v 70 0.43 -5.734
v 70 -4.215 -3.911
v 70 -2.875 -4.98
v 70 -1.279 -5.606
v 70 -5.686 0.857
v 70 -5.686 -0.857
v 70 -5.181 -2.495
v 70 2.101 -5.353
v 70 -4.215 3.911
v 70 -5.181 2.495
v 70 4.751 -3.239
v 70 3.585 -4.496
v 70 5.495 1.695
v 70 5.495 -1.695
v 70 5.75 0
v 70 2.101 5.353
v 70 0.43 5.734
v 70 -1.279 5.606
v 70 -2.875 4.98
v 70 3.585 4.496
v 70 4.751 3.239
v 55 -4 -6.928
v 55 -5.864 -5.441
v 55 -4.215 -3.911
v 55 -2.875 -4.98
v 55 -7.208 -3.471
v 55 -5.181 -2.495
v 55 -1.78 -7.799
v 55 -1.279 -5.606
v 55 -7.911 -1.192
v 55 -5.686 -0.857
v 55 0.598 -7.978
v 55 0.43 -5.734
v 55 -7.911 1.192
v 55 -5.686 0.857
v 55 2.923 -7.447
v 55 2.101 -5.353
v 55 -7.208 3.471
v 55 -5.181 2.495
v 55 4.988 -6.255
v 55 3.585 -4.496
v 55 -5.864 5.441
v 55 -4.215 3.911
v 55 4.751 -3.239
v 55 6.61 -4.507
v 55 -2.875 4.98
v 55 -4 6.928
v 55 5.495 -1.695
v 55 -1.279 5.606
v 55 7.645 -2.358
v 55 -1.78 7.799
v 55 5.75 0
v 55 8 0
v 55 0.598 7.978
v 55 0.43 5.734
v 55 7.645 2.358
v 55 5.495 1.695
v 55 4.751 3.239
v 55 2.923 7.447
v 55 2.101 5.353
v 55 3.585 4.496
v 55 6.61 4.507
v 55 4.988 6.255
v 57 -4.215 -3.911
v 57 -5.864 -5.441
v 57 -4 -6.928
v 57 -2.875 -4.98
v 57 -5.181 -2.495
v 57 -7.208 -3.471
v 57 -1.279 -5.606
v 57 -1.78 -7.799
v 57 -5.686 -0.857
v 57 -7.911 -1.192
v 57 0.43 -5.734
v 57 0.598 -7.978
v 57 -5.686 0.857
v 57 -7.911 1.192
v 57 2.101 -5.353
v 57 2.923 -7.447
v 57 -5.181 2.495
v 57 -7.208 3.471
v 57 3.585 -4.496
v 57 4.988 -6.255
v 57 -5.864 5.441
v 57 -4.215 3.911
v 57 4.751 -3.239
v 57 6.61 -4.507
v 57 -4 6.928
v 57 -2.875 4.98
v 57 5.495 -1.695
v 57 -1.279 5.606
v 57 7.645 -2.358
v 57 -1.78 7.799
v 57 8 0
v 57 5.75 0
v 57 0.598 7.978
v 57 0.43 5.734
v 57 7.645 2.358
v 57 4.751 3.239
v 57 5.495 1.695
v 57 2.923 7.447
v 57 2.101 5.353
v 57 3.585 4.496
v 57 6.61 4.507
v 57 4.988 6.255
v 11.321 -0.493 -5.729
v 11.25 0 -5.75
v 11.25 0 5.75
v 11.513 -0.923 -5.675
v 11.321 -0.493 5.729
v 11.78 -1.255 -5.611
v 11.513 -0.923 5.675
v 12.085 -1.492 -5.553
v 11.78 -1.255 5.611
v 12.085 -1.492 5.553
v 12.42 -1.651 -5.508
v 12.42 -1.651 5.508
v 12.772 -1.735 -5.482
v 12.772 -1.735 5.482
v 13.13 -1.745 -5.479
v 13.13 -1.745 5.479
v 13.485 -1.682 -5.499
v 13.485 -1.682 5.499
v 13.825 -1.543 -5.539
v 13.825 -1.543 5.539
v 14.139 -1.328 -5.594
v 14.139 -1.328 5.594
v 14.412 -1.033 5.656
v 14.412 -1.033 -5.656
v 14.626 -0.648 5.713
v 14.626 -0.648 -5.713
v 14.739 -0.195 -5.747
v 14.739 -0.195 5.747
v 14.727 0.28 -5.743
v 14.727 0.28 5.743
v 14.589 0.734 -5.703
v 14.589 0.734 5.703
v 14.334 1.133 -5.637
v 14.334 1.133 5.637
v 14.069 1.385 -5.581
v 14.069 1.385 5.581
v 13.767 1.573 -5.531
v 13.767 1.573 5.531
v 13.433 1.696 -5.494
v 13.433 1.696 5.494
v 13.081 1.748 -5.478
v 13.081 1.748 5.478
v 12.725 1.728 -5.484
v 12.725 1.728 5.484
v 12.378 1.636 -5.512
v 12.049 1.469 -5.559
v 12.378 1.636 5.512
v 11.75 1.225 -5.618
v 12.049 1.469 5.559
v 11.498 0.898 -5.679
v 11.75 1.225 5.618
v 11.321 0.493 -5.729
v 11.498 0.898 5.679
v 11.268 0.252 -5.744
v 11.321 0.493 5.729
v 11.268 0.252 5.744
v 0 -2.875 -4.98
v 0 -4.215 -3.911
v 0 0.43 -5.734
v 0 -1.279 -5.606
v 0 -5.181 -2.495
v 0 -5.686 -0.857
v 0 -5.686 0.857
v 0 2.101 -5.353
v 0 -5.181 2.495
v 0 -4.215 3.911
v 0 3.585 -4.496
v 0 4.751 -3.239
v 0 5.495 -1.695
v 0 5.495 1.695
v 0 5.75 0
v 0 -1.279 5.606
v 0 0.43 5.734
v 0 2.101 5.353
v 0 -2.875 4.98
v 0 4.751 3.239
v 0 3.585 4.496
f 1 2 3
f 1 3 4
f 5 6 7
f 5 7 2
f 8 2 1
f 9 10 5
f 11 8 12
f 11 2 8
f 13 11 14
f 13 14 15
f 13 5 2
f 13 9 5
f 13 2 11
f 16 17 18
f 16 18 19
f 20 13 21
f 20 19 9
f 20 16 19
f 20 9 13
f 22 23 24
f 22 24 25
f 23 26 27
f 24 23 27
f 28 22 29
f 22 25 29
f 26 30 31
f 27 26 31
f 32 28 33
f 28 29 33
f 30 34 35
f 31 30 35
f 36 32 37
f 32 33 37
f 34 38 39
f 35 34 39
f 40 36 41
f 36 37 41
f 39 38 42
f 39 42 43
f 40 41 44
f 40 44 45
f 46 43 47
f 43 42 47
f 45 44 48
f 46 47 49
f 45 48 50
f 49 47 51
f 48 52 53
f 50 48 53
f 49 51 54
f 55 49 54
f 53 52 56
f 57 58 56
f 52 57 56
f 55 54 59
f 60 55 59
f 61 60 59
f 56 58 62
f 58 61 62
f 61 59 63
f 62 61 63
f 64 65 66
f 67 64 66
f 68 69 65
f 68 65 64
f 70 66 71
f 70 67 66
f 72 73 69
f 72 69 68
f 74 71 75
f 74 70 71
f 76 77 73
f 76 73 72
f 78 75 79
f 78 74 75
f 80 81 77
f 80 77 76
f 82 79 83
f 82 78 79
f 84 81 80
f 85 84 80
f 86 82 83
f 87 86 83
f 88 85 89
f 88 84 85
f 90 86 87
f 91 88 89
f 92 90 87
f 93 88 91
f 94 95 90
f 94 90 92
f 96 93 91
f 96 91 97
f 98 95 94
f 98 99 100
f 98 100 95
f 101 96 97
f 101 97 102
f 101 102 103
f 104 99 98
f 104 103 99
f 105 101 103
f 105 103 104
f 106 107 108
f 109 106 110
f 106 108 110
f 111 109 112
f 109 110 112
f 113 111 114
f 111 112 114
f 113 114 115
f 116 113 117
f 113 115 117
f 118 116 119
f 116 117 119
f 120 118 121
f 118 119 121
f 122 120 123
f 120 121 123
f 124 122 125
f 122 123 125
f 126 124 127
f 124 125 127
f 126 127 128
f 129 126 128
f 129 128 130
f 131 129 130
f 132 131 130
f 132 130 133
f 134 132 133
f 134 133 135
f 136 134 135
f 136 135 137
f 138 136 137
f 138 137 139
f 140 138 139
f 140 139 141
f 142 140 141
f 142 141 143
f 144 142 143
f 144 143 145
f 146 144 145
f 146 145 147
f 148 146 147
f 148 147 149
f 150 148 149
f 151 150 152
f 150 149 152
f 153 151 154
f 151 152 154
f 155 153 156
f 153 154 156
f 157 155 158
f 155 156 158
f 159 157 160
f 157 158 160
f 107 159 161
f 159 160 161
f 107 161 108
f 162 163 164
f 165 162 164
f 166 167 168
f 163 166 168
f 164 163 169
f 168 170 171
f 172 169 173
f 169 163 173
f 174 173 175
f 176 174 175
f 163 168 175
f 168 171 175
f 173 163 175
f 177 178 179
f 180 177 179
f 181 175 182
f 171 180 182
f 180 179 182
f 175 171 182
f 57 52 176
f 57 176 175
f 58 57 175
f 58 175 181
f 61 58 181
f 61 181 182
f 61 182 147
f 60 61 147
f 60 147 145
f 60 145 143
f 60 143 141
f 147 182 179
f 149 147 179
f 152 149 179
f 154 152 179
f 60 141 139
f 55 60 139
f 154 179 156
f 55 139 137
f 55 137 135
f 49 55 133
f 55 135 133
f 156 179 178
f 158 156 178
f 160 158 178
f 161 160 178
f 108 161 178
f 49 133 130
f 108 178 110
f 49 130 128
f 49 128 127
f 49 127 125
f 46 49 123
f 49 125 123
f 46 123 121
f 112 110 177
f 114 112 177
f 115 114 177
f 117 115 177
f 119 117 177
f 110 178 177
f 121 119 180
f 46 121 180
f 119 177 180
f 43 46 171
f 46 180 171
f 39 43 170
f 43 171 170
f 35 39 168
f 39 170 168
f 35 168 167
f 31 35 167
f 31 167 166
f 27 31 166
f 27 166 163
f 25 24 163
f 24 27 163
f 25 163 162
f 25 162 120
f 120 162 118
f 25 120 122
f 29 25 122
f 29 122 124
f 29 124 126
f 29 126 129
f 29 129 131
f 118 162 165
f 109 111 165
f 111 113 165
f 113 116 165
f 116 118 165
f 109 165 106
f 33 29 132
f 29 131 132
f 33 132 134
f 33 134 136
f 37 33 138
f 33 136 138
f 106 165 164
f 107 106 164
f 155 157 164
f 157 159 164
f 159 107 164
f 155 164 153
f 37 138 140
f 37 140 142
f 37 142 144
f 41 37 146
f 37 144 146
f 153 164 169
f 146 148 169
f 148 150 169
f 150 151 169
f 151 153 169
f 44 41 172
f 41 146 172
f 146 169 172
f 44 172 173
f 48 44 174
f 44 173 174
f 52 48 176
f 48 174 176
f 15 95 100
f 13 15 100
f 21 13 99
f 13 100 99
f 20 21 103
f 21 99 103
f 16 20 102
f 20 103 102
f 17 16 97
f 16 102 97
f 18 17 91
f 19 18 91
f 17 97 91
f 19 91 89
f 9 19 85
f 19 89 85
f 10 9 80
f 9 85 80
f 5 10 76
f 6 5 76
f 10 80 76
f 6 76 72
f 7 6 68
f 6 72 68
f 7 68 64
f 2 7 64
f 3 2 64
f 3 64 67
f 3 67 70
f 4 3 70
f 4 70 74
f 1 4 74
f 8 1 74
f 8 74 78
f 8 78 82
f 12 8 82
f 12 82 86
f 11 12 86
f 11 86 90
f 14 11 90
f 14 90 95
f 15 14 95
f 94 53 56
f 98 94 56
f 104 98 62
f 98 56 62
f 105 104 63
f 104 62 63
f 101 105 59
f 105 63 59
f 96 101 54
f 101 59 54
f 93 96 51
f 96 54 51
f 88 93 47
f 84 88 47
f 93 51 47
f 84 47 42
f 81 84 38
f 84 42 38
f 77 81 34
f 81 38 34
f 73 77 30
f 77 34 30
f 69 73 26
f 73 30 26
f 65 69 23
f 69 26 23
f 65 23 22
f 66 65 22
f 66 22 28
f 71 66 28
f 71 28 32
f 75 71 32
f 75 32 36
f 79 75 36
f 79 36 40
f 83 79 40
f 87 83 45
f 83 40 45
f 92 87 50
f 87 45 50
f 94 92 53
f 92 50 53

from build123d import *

# Parameters (mm, degrees)
F0_R     = 5.75
F1_DEPTH = 70
F4_DEPTH = 25
F6_R     = 8
F7_DEPTH = 2


with BuildPart() as f1:
    # F0 (on Right) → F1 (new body)
    with BuildSketch(Plane.YZ):
        Circle(F0_R)
    extrude(amount=F1_DEPTH)

    # F3 (on offset) → F4 (cut)
    with BuildSketch(Plane.XY.offset(6.8)):
        with BuildLine():
            Line((11.25, 0), (13, 0))
            Line((13, 0), (14.75, 0))
            ThreePointArc((14.75, 0), (13, 1.75), (11.25, 0))
        make_face()
        with BuildLine():
            Line((14.75, 0), (13, 0))
            Line((13, 0), (11.25, 0))
            ThreePointArc((11.25, 0), (13, -1.75), (14.75, 0))
        make_face()
    extrude(amount=-F4_DEPTH, mode=Mode.SUBTRACT)

    # F6 (on offset) → F7 (join)
    with BuildSketch(Plane.YZ.offset(55)):
        Circle(F6_R)
    extrude(amount=F7_DEPTH)


solid = f1.part
